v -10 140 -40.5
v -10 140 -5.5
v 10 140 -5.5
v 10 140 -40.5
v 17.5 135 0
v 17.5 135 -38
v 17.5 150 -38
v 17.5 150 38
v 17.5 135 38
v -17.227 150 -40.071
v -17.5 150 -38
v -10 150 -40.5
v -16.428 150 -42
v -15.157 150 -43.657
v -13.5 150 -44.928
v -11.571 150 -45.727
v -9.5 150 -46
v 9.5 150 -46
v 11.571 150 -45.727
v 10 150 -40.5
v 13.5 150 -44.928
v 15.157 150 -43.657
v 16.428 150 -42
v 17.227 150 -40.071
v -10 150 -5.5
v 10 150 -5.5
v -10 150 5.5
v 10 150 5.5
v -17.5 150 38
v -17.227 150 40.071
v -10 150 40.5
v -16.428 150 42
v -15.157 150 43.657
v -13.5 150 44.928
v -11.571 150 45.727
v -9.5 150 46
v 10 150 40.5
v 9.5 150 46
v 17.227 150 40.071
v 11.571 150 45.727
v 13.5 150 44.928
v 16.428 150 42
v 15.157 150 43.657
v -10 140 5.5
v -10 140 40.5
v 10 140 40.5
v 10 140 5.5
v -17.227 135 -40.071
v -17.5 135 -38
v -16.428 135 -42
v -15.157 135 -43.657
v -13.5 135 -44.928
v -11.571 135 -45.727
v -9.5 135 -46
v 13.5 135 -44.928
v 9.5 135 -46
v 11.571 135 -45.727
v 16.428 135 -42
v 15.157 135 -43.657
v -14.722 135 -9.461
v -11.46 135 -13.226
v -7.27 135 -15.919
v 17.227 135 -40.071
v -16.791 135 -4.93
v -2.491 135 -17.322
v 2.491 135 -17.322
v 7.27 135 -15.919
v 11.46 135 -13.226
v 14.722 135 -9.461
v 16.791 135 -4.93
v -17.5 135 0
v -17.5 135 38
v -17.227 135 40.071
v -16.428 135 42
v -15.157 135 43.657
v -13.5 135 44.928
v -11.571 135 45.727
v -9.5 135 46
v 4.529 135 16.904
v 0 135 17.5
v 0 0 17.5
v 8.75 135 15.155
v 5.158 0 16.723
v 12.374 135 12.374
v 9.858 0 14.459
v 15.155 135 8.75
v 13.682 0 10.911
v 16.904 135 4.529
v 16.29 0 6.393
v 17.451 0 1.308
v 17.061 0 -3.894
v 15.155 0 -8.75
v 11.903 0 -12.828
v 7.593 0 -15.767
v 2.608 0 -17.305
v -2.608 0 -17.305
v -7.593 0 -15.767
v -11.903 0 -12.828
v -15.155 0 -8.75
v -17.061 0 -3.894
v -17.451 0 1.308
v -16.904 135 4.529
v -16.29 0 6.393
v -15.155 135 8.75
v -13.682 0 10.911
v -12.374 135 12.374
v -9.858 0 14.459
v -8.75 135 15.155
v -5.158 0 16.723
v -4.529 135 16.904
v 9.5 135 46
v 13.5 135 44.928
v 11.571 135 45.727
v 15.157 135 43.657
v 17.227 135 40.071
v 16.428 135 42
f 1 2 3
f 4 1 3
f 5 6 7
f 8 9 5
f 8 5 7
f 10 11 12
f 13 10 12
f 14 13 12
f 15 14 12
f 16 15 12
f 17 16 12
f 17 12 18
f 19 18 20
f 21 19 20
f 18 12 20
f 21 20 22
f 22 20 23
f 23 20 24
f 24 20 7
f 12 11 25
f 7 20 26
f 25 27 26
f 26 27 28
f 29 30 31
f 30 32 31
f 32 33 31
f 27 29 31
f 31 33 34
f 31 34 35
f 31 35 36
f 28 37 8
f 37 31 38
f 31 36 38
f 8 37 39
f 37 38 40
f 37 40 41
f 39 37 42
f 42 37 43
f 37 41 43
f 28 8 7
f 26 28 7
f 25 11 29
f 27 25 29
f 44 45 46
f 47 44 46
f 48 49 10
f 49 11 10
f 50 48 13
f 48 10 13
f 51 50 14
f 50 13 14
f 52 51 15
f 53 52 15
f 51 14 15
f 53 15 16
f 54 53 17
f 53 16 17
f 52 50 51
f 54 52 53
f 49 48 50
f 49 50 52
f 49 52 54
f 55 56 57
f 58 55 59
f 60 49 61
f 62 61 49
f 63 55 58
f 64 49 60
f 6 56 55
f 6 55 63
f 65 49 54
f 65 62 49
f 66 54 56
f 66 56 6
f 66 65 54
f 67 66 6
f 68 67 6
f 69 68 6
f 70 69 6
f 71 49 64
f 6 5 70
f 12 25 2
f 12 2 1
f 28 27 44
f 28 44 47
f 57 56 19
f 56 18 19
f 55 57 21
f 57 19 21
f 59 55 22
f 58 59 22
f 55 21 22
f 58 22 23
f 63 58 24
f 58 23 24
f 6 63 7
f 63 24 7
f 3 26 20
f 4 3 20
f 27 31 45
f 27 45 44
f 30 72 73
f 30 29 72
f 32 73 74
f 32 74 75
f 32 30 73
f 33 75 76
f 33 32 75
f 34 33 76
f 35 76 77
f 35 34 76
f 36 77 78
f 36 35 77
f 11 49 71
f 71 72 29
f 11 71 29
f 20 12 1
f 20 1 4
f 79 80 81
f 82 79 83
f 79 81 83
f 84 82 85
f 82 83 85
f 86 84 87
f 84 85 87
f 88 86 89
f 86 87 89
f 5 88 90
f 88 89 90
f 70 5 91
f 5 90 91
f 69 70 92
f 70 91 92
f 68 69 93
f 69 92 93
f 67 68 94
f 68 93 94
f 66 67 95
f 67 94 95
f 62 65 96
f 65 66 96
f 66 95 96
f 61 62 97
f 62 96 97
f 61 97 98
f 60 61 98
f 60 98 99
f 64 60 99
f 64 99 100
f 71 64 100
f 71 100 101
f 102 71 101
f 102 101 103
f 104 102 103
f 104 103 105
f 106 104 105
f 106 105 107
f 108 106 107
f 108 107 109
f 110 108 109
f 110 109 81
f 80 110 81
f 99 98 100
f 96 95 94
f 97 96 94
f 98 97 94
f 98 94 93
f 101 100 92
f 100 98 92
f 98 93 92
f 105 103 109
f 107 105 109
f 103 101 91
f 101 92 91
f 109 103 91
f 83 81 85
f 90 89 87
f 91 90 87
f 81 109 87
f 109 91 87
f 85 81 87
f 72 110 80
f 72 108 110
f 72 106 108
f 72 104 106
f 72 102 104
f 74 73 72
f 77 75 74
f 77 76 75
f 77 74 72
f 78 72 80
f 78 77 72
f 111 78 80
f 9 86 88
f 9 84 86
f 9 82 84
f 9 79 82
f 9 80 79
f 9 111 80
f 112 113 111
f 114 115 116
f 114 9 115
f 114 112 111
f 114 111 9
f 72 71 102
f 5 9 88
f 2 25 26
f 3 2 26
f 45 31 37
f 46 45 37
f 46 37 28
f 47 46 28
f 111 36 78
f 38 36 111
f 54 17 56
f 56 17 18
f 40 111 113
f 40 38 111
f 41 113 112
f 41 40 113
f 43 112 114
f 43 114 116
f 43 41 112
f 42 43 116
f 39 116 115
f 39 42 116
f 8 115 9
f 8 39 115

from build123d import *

# Parameters (mm, degrees)
SKETCH1_R           = 17.5
BOSS_EXTRUDE1_DEPTH = 150
SKETCH2_W           = 35
SKETCH2_H           = 15
BOSS_EXTRUDE2_DEPTH = 46
SKETCH3_W           = 20
SKETCH3_H           = 35
CUT_EXTRUDE1_DEPTH  = 10
FILLET1_R           = 8


with BuildPart() as part:
    # Sketch1 → Boss-Extrude1 (new body)
    with BuildSketch(Plane(origin=(0, 0, 0), x_dir=(1, 0, 0), z_dir=(0, 1, 0))):
        with Locations(Location((0, 0, 0), (0, 0, 270))):
            Circle(SKETCH1_R)
    extrude(amount=BOSS_EXTRUDE1_DEPTH)

    # Sketch2 → Boss-Extrude2 (add, symmetric)
    with BuildSketch(Plane.XY):
        with Locations((0, 142.5)):
            Rectangle(SKETCH2_W, SKETCH2_H)
    extrude(amount=BOSS_EXTRUDE2_DEPTH, both=True)

    # Sketch3 → Cut-Extrude1 (cut)
    with BuildSketch(Plane(origin=(0, 150, 0), x_dir=(1, 0, 0), z_dir=(0, 1, 0))):
        with Locations((0, 23)):
            Rectangle(SKETCH3_W, SKETCH3_H)
        with Locations((0, -23)):
            Rectangle(SKETCH3_W, SKETCH3_H)
    extrude(amount=-CUT_EXTRUDE1_DEPTH, mode=Mode.SUBTRACT)

    # Fillet1
    fillet1_edges = [part.edges().sort_by_distance(p)[0] for p in [
        (-17.5, 142.5, 46),
        (17.5, 142.5, 46),
        (17.5, 142.5, -46),
        (-17.5, 142.5, -46),
    ]]
    fillet(fillet1_edges, radius=FILLET1_R)


solid = part.part
